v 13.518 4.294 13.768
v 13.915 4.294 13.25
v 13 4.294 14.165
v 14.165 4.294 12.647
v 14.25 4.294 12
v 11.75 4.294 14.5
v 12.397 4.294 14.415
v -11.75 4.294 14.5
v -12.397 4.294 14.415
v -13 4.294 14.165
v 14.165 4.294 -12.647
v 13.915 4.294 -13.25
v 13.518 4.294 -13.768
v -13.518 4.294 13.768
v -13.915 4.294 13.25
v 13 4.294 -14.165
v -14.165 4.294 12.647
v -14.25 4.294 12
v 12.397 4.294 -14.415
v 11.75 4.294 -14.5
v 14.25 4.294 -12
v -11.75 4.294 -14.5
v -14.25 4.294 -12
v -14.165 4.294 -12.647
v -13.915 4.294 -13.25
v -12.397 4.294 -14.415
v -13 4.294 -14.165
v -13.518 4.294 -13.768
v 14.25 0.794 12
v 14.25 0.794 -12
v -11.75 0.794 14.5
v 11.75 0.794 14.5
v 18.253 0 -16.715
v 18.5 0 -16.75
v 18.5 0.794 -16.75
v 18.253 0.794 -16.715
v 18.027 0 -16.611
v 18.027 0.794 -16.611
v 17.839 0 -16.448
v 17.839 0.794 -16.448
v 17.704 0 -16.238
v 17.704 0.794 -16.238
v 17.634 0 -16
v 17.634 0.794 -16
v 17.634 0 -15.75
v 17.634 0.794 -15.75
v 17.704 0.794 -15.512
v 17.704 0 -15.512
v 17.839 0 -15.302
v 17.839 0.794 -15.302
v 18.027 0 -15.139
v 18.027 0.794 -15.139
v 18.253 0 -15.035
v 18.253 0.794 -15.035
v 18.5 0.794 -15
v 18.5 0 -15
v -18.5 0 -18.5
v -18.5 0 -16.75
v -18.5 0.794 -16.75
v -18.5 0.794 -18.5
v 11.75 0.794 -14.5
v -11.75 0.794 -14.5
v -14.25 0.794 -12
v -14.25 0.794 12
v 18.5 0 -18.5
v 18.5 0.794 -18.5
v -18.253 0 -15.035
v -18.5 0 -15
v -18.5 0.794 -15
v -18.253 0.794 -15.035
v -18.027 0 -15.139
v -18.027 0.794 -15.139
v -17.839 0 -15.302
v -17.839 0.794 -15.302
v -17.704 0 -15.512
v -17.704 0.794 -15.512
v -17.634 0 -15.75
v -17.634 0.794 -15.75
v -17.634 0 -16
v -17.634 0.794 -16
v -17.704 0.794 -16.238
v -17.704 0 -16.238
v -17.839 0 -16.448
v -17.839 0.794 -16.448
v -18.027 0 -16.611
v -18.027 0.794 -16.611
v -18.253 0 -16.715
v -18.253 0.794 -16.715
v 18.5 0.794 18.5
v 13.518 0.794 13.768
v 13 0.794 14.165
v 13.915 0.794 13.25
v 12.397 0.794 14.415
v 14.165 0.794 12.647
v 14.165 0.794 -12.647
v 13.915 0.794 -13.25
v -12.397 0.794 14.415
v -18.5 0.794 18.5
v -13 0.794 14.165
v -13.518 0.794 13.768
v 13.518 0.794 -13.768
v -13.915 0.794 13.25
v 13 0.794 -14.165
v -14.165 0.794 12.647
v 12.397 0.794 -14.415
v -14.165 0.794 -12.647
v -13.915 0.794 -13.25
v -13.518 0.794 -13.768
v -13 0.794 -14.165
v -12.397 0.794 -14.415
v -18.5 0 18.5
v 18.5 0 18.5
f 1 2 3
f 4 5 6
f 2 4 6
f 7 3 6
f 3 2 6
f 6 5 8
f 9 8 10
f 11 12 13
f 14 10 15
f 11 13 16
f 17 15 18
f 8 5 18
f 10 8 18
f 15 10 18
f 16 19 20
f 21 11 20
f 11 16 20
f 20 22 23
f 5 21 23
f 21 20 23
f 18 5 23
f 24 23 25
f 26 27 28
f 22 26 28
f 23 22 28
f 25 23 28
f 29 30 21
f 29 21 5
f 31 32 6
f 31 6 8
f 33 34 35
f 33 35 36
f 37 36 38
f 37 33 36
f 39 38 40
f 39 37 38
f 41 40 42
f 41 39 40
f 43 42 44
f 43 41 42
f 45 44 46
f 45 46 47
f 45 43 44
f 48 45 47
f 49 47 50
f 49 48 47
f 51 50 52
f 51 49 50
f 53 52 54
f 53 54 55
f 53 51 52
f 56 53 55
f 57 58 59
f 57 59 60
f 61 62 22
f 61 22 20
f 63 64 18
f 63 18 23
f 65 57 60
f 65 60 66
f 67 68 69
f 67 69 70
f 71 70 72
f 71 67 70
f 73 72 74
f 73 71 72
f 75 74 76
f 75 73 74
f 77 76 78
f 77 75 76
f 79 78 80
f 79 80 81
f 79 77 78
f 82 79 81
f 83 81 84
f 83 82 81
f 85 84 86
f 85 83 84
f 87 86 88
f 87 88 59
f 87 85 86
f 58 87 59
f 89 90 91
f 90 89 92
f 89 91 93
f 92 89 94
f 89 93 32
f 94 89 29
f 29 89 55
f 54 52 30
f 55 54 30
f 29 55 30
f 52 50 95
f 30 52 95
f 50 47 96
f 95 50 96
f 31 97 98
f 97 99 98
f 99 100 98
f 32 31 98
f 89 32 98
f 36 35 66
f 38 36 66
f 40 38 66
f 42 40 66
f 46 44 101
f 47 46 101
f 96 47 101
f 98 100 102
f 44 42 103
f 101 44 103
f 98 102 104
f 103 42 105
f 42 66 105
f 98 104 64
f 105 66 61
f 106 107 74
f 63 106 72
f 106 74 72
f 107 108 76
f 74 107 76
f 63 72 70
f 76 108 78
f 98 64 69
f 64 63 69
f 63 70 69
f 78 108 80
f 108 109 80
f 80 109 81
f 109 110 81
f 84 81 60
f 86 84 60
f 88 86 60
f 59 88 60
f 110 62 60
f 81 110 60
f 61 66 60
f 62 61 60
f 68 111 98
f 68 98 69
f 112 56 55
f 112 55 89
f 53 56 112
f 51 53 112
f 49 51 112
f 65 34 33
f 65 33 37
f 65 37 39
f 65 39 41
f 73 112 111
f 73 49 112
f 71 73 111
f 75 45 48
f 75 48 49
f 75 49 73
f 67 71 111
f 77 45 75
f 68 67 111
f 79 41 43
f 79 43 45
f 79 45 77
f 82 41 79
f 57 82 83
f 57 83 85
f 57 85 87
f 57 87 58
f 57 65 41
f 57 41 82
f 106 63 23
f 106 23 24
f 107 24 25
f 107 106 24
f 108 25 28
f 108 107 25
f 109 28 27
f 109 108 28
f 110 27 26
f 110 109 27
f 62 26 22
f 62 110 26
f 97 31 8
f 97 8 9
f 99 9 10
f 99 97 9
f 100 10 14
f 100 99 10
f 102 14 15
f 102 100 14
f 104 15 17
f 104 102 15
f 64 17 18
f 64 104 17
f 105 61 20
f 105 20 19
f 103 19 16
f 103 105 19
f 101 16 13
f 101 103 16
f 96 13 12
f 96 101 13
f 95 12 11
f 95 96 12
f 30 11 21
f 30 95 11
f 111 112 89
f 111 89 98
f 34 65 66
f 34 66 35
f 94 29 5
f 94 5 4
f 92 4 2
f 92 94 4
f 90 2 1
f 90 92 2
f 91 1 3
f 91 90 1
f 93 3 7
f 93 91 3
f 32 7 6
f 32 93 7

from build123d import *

# Parameters (mm, degrees)
BOSS_EXTRUDE1_DEPTH = 0.79375
BOSS_EXTRUDE2_DEPTH = 3.5


with BuildPart() as part:
    # Sketch1 → Boss-Extrude1 (new body)
    with BuildSketch(Plane(origin=(0, 0, 0), x_dir=(1, 0, 0), z_dir=(0, 1, 0))):
        with BuildLine():
            Line((-18.5, 18.5), (18.5, 18.5))
            Line((18.5, 18.5), (18.5, 16.75))
            ThreePointArc((18.5, 16.75), (17.625, 15.875), (18.5, 15))
            Line((18.5, 15), (18.5, -18.5))
            Line((18.5, -18.5), (-18.5, -18.5))
            Line((-18.5, -18.5), (-18.5, 15))
            ThreePointArc((-18.5, 15), (-17.625, 15.875), (-18.5, 16.75))
            Line((-18.5, 16.75), (-18.5, 18.5))
        make_face()
    extrude(amount=BOSS_EXTRUDE1_DEPTH)

    # Sketch2 → Boss-Extrude2 (add)
    with BuildSketch(Plane(origin=(0, 0.79375, 0), x_dir=(1, 0, 0), z_dir=(0, 1, 0))):
        with BuildLine():
            Line((-11.75, 14.5), (11.75, 14.5))
            ThreePointArc((11.75, 14.5), (13.517766953, 13.767766953), (14.25, 12))
            Line((14.25, 12), (14.25, -12))
            ThreePointArc((14.25, -12), (13.517766953, -13.767766953), (11.75, -14.5))
            Line((11.75, -14.5), (-11.75, -14.5))
            ThreePointArc((-11.75, -14.5), (-13.517766953, -13.767766953), (-14.25, -12))
            Line((-14.25, -12), (-14.25, 12))
            ThreePointArc((-14.25, 12), (-13.517766953, 13.767766953), (-11.75, 14.5))
        make_face()
    extrude(amount=BOSS_EXTRUDE2_DEPTH)


solid = part.part
